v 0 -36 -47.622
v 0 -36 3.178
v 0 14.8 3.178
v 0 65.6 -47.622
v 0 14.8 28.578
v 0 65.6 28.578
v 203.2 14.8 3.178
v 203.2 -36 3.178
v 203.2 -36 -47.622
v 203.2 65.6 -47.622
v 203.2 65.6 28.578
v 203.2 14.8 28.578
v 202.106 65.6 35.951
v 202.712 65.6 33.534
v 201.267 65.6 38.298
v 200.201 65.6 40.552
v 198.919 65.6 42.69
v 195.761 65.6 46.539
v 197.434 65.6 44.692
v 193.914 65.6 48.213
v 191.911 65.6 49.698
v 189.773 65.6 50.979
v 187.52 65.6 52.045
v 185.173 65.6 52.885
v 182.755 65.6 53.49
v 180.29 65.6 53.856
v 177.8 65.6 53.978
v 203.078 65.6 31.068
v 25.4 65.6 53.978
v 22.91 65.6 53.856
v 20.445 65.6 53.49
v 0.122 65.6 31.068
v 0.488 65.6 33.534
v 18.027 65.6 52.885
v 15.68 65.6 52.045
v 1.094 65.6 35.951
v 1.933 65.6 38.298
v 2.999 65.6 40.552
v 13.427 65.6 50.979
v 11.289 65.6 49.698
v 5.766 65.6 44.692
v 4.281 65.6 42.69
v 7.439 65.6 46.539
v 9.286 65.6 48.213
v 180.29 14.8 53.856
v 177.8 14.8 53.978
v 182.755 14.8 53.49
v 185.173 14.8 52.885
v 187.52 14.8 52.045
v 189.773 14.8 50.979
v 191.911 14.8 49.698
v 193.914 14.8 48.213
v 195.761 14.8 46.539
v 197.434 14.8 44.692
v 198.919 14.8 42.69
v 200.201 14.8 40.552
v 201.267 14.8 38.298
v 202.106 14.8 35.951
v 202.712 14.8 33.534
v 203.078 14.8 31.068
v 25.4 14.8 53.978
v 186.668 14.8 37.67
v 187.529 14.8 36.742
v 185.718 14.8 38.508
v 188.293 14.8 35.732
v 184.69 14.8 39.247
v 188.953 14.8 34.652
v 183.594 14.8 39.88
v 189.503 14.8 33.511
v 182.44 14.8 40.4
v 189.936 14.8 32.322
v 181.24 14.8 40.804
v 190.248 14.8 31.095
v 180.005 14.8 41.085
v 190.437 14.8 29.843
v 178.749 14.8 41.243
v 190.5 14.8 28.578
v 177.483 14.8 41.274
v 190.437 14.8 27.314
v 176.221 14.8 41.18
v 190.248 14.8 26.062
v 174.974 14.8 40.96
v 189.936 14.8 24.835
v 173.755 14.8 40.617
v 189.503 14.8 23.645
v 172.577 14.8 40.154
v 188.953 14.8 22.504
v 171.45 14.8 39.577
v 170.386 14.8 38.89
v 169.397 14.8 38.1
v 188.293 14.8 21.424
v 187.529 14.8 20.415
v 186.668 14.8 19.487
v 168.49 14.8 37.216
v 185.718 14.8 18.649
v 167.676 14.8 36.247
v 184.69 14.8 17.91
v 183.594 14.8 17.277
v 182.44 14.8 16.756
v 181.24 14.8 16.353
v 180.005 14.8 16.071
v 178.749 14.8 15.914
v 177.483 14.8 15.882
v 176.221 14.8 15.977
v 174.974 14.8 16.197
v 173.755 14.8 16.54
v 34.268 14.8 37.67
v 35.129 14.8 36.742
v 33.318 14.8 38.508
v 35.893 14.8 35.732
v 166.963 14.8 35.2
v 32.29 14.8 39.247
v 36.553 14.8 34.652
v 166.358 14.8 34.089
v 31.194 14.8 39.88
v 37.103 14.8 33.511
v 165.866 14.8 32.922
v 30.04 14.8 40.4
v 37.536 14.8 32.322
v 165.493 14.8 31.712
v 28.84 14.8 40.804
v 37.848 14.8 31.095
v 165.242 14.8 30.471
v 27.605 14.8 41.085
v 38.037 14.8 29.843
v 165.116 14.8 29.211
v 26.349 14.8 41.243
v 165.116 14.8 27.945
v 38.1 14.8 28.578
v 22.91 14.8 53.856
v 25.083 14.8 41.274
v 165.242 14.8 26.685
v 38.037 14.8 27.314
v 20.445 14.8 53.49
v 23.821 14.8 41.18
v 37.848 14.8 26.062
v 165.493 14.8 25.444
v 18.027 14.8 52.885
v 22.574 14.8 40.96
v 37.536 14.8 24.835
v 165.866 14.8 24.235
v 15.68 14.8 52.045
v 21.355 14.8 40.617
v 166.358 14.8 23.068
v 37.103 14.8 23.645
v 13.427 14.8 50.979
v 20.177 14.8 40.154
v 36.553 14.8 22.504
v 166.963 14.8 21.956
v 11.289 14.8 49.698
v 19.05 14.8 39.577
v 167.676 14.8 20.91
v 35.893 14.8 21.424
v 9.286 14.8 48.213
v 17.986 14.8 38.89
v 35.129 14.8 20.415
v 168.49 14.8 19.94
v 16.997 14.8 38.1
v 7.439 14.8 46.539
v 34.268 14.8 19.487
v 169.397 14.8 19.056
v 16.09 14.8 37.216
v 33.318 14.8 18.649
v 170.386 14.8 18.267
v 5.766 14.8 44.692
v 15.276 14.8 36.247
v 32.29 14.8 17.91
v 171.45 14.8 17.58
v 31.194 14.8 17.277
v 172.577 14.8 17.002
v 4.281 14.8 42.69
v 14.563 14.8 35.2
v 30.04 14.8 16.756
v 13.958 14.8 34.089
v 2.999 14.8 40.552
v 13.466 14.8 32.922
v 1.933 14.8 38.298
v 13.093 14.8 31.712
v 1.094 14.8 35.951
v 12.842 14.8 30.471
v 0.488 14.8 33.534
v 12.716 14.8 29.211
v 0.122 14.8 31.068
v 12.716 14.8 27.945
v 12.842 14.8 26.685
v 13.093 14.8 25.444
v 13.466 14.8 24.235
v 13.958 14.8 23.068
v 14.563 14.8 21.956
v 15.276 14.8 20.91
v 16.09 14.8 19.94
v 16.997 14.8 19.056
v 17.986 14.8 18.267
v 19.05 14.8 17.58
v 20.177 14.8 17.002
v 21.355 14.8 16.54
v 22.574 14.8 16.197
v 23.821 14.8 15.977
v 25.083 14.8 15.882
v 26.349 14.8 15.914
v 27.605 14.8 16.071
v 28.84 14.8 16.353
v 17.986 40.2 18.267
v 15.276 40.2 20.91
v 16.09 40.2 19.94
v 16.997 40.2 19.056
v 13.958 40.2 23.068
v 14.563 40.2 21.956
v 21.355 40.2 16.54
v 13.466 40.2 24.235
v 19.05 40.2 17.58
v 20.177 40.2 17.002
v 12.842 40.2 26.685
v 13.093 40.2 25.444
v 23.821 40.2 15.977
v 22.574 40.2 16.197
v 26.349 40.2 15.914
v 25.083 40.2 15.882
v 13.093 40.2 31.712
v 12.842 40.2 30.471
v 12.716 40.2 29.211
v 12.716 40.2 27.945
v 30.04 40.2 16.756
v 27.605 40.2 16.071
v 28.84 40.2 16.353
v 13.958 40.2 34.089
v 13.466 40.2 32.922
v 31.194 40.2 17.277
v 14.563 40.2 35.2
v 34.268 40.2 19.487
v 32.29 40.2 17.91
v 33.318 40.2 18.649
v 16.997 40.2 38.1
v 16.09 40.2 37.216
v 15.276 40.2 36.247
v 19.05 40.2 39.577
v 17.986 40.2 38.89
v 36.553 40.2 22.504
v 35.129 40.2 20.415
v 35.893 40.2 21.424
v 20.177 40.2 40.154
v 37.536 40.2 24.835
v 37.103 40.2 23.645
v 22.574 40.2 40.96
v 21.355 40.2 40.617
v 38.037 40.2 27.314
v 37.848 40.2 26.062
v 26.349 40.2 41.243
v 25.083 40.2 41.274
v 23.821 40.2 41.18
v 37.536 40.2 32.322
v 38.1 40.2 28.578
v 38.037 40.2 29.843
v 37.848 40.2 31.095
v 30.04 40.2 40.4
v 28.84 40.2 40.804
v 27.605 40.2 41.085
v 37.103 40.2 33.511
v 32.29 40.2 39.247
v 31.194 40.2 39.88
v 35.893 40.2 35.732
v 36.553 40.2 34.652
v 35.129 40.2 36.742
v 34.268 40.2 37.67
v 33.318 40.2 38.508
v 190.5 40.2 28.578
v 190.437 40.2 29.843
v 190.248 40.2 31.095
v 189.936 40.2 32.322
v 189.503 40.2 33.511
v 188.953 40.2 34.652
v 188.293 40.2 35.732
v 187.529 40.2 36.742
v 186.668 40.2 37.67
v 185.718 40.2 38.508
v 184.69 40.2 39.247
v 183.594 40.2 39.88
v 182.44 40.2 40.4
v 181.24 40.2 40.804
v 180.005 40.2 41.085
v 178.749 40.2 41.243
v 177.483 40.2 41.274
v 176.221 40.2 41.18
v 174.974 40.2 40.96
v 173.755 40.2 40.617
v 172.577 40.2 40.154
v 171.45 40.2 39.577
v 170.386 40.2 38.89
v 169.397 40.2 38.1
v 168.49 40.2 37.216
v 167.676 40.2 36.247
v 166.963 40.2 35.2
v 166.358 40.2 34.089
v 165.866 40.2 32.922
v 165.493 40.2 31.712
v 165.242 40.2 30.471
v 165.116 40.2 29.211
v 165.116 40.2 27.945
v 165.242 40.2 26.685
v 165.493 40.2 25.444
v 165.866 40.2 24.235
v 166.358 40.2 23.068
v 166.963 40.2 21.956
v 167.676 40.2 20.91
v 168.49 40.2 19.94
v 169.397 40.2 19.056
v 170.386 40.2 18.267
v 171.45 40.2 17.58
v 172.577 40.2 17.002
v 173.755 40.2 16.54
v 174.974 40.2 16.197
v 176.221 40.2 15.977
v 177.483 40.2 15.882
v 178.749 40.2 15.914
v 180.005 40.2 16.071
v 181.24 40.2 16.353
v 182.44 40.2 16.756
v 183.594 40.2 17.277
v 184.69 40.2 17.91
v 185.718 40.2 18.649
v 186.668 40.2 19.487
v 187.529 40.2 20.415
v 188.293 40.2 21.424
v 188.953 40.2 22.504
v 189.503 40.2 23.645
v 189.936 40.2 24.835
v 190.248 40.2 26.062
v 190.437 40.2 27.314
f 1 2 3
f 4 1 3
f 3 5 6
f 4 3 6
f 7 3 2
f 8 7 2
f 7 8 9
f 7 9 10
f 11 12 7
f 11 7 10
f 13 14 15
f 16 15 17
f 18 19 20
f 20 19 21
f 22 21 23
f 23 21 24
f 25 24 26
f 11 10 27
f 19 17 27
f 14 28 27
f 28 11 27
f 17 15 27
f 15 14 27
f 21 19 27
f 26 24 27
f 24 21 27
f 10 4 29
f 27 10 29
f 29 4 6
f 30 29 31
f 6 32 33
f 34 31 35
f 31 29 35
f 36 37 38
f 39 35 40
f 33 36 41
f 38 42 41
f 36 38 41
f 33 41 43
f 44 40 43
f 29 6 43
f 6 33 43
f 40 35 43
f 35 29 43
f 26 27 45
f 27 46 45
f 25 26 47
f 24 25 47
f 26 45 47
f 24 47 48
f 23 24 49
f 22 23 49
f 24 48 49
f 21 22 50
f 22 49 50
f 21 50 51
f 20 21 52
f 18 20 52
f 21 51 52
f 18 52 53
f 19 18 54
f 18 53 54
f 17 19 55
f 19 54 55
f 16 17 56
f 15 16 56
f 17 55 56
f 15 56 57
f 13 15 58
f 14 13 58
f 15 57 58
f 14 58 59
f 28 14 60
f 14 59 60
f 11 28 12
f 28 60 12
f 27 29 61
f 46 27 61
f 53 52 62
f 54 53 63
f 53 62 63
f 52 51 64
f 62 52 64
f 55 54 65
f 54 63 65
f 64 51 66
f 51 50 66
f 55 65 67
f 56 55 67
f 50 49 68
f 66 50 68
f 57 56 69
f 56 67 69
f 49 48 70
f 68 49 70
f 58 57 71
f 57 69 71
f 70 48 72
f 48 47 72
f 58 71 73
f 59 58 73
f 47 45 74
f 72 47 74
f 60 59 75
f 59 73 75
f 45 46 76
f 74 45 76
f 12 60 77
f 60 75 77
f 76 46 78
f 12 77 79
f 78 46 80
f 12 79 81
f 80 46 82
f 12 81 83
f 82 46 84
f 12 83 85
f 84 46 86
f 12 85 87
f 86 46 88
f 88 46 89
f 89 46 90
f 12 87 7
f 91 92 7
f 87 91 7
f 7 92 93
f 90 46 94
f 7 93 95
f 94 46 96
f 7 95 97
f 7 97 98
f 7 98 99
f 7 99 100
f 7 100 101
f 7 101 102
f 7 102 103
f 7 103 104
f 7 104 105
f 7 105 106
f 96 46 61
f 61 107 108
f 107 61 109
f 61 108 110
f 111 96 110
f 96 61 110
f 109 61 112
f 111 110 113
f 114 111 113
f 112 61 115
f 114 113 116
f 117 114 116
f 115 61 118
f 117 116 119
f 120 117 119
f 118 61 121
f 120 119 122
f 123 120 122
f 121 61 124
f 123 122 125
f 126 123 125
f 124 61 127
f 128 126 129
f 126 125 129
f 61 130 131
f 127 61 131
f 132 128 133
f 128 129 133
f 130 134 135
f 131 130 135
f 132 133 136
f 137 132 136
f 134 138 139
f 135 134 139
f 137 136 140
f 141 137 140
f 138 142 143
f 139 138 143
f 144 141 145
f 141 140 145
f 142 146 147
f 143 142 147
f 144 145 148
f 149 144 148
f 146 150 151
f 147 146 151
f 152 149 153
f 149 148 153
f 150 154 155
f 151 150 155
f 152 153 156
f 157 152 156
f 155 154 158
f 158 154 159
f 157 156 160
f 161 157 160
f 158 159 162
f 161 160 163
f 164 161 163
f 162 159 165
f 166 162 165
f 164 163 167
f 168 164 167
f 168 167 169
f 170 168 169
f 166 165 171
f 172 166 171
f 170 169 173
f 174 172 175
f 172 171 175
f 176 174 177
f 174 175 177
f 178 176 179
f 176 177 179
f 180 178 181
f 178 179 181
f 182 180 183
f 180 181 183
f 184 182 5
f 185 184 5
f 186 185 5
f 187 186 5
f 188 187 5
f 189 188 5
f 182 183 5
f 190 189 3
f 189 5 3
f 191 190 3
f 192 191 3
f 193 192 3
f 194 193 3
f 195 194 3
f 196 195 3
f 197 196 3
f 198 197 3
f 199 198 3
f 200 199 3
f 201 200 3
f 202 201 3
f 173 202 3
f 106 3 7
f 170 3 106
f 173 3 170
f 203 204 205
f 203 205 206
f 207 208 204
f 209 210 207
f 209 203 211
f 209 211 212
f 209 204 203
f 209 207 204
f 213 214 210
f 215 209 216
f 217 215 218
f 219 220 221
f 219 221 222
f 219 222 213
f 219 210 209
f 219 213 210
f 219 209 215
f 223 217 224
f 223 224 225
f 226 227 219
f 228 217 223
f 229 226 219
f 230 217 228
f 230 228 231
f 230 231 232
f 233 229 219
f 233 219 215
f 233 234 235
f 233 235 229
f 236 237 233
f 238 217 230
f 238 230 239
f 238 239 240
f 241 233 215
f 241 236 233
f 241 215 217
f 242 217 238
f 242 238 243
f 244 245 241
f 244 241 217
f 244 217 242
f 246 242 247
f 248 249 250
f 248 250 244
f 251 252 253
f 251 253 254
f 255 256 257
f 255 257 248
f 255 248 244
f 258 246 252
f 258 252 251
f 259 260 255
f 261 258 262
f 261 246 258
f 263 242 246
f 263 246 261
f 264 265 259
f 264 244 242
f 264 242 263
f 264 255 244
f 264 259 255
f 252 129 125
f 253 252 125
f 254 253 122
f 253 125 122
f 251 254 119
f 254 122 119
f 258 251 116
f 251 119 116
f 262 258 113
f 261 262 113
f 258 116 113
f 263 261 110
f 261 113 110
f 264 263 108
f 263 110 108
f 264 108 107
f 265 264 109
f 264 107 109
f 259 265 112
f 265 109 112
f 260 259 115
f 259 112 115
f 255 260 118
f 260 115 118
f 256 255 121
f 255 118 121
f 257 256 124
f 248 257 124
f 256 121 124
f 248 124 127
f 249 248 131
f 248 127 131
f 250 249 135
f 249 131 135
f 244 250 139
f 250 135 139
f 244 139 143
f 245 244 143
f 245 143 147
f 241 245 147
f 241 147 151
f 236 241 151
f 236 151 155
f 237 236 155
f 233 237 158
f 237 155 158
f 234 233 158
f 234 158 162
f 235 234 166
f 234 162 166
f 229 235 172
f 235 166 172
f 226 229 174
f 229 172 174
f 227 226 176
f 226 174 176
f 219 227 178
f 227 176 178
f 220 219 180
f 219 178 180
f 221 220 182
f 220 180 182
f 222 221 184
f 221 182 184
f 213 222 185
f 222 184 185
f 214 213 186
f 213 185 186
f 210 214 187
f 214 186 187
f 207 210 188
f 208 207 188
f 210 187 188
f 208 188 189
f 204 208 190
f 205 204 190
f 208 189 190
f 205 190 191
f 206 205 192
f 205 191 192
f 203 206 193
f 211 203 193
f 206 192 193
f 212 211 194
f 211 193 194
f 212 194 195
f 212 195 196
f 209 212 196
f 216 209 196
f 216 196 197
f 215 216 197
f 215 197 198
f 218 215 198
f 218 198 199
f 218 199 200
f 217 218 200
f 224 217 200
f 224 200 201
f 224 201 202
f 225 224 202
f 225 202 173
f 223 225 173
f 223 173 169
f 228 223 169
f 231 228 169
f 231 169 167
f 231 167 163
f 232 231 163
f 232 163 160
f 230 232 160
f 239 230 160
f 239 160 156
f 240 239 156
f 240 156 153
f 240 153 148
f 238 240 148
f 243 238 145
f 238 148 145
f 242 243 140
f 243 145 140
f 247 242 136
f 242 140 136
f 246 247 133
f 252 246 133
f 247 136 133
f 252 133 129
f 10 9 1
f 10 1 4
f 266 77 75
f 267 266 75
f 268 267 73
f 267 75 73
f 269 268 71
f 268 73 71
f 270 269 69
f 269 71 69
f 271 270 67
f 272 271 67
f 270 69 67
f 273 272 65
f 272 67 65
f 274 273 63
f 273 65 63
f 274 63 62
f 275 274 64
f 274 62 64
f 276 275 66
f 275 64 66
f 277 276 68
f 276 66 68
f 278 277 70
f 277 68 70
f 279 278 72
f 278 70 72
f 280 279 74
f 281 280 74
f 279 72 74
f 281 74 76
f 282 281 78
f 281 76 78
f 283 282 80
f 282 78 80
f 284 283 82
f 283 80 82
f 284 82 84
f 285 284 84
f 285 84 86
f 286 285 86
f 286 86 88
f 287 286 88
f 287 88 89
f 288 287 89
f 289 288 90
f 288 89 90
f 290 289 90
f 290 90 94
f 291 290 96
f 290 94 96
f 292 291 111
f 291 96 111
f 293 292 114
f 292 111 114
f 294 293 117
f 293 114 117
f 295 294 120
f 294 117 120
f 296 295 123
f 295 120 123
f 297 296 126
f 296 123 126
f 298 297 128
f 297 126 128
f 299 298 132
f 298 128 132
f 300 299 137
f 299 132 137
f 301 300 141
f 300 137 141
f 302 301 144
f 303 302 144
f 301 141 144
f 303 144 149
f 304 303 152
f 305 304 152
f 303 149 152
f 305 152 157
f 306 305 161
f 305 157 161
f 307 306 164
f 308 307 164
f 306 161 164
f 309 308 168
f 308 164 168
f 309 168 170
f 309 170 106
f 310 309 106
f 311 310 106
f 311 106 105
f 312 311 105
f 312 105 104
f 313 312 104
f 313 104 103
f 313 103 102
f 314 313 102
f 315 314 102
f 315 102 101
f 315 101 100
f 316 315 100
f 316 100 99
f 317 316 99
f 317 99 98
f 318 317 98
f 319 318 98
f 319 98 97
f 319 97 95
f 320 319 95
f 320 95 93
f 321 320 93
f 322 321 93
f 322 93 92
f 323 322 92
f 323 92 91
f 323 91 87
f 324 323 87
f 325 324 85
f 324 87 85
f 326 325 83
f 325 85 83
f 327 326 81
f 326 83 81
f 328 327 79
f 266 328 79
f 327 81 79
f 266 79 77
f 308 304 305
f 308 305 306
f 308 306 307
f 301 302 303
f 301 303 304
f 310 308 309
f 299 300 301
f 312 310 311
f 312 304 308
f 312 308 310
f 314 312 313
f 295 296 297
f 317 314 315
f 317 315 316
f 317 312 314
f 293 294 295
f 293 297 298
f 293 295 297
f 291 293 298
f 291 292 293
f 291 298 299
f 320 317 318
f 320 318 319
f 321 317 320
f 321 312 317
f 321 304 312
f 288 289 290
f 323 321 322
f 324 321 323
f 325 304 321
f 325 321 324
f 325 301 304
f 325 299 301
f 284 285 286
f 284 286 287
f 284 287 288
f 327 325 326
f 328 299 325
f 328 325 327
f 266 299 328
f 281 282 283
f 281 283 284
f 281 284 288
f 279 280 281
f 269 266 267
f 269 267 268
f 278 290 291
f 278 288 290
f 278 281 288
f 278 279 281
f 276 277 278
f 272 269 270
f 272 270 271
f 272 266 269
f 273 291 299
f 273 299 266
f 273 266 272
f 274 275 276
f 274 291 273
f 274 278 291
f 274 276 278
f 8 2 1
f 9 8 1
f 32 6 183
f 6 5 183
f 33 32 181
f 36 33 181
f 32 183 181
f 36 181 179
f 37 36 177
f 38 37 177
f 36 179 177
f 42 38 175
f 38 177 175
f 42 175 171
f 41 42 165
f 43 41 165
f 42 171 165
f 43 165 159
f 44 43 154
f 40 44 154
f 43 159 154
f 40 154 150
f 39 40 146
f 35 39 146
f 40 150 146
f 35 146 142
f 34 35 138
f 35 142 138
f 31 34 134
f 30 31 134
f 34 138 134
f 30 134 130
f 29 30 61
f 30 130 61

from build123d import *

# Parameters (mm, degrees)
F1_DEPTH = 203.2
F2_W     = 76.2
F2_H     = 50.8
F3_DEPTH = 50.8
F4_R     = 25.4
F5_R     = 12.7
F6_DEPTH = 25.4


with BuildPart() as f1:
    # F0 (on Right) → F1 (new body)
    with BuildSketch(Plane.YZ):
        Polygon((14.799971, 3.178266), (-36.000029, 3.178266), (-36.000029, -47.621734), (65.599971, -47.621734), (65.599971, 3.178266), (65.599971, 53.978266), (14.799971, 53.978266), align=None)
    extrude(amount=F1_DEPTH)

    # F2 (on face) → F3 (cut)
    with BuildSketch(Plane(origin=(0, 0, -47.621734), x_dir=(1, 0, 0), z_dir=(0, 0, -1))):
        with Locations((38.1, 61.400029)):
            Rectangle(F2_W, F2_H)
        with Locations((241.3, 10.600029)):
            Rectangle(F2_W, F2_H)
    extrude(amount=-F3_DEPTH, mode=Mode.SUBTRACT)

    # F4
    f4_edges = [f1.edges().sort_by_distance(p)[0] for p in [
        (0, 40.199971, 53.978266),
        (203.2, 40.199971, 53.978266),
    ]]
    fillet(f4_edges, radius=F4_R)

    # F5 (on face) → F6 (cut)
    with BuildSketch(Plane.XZ.offset(-14.799971)):
        with Locations((25.4, 28.578266)):
            Circle(F5_R)
        with Locations((177.8, 28.578266)):
            Circle(F5_R)
    extrude(amount=-F6_DEPTH, mode=Mode.SUBTRACT)


solid = f1.part
